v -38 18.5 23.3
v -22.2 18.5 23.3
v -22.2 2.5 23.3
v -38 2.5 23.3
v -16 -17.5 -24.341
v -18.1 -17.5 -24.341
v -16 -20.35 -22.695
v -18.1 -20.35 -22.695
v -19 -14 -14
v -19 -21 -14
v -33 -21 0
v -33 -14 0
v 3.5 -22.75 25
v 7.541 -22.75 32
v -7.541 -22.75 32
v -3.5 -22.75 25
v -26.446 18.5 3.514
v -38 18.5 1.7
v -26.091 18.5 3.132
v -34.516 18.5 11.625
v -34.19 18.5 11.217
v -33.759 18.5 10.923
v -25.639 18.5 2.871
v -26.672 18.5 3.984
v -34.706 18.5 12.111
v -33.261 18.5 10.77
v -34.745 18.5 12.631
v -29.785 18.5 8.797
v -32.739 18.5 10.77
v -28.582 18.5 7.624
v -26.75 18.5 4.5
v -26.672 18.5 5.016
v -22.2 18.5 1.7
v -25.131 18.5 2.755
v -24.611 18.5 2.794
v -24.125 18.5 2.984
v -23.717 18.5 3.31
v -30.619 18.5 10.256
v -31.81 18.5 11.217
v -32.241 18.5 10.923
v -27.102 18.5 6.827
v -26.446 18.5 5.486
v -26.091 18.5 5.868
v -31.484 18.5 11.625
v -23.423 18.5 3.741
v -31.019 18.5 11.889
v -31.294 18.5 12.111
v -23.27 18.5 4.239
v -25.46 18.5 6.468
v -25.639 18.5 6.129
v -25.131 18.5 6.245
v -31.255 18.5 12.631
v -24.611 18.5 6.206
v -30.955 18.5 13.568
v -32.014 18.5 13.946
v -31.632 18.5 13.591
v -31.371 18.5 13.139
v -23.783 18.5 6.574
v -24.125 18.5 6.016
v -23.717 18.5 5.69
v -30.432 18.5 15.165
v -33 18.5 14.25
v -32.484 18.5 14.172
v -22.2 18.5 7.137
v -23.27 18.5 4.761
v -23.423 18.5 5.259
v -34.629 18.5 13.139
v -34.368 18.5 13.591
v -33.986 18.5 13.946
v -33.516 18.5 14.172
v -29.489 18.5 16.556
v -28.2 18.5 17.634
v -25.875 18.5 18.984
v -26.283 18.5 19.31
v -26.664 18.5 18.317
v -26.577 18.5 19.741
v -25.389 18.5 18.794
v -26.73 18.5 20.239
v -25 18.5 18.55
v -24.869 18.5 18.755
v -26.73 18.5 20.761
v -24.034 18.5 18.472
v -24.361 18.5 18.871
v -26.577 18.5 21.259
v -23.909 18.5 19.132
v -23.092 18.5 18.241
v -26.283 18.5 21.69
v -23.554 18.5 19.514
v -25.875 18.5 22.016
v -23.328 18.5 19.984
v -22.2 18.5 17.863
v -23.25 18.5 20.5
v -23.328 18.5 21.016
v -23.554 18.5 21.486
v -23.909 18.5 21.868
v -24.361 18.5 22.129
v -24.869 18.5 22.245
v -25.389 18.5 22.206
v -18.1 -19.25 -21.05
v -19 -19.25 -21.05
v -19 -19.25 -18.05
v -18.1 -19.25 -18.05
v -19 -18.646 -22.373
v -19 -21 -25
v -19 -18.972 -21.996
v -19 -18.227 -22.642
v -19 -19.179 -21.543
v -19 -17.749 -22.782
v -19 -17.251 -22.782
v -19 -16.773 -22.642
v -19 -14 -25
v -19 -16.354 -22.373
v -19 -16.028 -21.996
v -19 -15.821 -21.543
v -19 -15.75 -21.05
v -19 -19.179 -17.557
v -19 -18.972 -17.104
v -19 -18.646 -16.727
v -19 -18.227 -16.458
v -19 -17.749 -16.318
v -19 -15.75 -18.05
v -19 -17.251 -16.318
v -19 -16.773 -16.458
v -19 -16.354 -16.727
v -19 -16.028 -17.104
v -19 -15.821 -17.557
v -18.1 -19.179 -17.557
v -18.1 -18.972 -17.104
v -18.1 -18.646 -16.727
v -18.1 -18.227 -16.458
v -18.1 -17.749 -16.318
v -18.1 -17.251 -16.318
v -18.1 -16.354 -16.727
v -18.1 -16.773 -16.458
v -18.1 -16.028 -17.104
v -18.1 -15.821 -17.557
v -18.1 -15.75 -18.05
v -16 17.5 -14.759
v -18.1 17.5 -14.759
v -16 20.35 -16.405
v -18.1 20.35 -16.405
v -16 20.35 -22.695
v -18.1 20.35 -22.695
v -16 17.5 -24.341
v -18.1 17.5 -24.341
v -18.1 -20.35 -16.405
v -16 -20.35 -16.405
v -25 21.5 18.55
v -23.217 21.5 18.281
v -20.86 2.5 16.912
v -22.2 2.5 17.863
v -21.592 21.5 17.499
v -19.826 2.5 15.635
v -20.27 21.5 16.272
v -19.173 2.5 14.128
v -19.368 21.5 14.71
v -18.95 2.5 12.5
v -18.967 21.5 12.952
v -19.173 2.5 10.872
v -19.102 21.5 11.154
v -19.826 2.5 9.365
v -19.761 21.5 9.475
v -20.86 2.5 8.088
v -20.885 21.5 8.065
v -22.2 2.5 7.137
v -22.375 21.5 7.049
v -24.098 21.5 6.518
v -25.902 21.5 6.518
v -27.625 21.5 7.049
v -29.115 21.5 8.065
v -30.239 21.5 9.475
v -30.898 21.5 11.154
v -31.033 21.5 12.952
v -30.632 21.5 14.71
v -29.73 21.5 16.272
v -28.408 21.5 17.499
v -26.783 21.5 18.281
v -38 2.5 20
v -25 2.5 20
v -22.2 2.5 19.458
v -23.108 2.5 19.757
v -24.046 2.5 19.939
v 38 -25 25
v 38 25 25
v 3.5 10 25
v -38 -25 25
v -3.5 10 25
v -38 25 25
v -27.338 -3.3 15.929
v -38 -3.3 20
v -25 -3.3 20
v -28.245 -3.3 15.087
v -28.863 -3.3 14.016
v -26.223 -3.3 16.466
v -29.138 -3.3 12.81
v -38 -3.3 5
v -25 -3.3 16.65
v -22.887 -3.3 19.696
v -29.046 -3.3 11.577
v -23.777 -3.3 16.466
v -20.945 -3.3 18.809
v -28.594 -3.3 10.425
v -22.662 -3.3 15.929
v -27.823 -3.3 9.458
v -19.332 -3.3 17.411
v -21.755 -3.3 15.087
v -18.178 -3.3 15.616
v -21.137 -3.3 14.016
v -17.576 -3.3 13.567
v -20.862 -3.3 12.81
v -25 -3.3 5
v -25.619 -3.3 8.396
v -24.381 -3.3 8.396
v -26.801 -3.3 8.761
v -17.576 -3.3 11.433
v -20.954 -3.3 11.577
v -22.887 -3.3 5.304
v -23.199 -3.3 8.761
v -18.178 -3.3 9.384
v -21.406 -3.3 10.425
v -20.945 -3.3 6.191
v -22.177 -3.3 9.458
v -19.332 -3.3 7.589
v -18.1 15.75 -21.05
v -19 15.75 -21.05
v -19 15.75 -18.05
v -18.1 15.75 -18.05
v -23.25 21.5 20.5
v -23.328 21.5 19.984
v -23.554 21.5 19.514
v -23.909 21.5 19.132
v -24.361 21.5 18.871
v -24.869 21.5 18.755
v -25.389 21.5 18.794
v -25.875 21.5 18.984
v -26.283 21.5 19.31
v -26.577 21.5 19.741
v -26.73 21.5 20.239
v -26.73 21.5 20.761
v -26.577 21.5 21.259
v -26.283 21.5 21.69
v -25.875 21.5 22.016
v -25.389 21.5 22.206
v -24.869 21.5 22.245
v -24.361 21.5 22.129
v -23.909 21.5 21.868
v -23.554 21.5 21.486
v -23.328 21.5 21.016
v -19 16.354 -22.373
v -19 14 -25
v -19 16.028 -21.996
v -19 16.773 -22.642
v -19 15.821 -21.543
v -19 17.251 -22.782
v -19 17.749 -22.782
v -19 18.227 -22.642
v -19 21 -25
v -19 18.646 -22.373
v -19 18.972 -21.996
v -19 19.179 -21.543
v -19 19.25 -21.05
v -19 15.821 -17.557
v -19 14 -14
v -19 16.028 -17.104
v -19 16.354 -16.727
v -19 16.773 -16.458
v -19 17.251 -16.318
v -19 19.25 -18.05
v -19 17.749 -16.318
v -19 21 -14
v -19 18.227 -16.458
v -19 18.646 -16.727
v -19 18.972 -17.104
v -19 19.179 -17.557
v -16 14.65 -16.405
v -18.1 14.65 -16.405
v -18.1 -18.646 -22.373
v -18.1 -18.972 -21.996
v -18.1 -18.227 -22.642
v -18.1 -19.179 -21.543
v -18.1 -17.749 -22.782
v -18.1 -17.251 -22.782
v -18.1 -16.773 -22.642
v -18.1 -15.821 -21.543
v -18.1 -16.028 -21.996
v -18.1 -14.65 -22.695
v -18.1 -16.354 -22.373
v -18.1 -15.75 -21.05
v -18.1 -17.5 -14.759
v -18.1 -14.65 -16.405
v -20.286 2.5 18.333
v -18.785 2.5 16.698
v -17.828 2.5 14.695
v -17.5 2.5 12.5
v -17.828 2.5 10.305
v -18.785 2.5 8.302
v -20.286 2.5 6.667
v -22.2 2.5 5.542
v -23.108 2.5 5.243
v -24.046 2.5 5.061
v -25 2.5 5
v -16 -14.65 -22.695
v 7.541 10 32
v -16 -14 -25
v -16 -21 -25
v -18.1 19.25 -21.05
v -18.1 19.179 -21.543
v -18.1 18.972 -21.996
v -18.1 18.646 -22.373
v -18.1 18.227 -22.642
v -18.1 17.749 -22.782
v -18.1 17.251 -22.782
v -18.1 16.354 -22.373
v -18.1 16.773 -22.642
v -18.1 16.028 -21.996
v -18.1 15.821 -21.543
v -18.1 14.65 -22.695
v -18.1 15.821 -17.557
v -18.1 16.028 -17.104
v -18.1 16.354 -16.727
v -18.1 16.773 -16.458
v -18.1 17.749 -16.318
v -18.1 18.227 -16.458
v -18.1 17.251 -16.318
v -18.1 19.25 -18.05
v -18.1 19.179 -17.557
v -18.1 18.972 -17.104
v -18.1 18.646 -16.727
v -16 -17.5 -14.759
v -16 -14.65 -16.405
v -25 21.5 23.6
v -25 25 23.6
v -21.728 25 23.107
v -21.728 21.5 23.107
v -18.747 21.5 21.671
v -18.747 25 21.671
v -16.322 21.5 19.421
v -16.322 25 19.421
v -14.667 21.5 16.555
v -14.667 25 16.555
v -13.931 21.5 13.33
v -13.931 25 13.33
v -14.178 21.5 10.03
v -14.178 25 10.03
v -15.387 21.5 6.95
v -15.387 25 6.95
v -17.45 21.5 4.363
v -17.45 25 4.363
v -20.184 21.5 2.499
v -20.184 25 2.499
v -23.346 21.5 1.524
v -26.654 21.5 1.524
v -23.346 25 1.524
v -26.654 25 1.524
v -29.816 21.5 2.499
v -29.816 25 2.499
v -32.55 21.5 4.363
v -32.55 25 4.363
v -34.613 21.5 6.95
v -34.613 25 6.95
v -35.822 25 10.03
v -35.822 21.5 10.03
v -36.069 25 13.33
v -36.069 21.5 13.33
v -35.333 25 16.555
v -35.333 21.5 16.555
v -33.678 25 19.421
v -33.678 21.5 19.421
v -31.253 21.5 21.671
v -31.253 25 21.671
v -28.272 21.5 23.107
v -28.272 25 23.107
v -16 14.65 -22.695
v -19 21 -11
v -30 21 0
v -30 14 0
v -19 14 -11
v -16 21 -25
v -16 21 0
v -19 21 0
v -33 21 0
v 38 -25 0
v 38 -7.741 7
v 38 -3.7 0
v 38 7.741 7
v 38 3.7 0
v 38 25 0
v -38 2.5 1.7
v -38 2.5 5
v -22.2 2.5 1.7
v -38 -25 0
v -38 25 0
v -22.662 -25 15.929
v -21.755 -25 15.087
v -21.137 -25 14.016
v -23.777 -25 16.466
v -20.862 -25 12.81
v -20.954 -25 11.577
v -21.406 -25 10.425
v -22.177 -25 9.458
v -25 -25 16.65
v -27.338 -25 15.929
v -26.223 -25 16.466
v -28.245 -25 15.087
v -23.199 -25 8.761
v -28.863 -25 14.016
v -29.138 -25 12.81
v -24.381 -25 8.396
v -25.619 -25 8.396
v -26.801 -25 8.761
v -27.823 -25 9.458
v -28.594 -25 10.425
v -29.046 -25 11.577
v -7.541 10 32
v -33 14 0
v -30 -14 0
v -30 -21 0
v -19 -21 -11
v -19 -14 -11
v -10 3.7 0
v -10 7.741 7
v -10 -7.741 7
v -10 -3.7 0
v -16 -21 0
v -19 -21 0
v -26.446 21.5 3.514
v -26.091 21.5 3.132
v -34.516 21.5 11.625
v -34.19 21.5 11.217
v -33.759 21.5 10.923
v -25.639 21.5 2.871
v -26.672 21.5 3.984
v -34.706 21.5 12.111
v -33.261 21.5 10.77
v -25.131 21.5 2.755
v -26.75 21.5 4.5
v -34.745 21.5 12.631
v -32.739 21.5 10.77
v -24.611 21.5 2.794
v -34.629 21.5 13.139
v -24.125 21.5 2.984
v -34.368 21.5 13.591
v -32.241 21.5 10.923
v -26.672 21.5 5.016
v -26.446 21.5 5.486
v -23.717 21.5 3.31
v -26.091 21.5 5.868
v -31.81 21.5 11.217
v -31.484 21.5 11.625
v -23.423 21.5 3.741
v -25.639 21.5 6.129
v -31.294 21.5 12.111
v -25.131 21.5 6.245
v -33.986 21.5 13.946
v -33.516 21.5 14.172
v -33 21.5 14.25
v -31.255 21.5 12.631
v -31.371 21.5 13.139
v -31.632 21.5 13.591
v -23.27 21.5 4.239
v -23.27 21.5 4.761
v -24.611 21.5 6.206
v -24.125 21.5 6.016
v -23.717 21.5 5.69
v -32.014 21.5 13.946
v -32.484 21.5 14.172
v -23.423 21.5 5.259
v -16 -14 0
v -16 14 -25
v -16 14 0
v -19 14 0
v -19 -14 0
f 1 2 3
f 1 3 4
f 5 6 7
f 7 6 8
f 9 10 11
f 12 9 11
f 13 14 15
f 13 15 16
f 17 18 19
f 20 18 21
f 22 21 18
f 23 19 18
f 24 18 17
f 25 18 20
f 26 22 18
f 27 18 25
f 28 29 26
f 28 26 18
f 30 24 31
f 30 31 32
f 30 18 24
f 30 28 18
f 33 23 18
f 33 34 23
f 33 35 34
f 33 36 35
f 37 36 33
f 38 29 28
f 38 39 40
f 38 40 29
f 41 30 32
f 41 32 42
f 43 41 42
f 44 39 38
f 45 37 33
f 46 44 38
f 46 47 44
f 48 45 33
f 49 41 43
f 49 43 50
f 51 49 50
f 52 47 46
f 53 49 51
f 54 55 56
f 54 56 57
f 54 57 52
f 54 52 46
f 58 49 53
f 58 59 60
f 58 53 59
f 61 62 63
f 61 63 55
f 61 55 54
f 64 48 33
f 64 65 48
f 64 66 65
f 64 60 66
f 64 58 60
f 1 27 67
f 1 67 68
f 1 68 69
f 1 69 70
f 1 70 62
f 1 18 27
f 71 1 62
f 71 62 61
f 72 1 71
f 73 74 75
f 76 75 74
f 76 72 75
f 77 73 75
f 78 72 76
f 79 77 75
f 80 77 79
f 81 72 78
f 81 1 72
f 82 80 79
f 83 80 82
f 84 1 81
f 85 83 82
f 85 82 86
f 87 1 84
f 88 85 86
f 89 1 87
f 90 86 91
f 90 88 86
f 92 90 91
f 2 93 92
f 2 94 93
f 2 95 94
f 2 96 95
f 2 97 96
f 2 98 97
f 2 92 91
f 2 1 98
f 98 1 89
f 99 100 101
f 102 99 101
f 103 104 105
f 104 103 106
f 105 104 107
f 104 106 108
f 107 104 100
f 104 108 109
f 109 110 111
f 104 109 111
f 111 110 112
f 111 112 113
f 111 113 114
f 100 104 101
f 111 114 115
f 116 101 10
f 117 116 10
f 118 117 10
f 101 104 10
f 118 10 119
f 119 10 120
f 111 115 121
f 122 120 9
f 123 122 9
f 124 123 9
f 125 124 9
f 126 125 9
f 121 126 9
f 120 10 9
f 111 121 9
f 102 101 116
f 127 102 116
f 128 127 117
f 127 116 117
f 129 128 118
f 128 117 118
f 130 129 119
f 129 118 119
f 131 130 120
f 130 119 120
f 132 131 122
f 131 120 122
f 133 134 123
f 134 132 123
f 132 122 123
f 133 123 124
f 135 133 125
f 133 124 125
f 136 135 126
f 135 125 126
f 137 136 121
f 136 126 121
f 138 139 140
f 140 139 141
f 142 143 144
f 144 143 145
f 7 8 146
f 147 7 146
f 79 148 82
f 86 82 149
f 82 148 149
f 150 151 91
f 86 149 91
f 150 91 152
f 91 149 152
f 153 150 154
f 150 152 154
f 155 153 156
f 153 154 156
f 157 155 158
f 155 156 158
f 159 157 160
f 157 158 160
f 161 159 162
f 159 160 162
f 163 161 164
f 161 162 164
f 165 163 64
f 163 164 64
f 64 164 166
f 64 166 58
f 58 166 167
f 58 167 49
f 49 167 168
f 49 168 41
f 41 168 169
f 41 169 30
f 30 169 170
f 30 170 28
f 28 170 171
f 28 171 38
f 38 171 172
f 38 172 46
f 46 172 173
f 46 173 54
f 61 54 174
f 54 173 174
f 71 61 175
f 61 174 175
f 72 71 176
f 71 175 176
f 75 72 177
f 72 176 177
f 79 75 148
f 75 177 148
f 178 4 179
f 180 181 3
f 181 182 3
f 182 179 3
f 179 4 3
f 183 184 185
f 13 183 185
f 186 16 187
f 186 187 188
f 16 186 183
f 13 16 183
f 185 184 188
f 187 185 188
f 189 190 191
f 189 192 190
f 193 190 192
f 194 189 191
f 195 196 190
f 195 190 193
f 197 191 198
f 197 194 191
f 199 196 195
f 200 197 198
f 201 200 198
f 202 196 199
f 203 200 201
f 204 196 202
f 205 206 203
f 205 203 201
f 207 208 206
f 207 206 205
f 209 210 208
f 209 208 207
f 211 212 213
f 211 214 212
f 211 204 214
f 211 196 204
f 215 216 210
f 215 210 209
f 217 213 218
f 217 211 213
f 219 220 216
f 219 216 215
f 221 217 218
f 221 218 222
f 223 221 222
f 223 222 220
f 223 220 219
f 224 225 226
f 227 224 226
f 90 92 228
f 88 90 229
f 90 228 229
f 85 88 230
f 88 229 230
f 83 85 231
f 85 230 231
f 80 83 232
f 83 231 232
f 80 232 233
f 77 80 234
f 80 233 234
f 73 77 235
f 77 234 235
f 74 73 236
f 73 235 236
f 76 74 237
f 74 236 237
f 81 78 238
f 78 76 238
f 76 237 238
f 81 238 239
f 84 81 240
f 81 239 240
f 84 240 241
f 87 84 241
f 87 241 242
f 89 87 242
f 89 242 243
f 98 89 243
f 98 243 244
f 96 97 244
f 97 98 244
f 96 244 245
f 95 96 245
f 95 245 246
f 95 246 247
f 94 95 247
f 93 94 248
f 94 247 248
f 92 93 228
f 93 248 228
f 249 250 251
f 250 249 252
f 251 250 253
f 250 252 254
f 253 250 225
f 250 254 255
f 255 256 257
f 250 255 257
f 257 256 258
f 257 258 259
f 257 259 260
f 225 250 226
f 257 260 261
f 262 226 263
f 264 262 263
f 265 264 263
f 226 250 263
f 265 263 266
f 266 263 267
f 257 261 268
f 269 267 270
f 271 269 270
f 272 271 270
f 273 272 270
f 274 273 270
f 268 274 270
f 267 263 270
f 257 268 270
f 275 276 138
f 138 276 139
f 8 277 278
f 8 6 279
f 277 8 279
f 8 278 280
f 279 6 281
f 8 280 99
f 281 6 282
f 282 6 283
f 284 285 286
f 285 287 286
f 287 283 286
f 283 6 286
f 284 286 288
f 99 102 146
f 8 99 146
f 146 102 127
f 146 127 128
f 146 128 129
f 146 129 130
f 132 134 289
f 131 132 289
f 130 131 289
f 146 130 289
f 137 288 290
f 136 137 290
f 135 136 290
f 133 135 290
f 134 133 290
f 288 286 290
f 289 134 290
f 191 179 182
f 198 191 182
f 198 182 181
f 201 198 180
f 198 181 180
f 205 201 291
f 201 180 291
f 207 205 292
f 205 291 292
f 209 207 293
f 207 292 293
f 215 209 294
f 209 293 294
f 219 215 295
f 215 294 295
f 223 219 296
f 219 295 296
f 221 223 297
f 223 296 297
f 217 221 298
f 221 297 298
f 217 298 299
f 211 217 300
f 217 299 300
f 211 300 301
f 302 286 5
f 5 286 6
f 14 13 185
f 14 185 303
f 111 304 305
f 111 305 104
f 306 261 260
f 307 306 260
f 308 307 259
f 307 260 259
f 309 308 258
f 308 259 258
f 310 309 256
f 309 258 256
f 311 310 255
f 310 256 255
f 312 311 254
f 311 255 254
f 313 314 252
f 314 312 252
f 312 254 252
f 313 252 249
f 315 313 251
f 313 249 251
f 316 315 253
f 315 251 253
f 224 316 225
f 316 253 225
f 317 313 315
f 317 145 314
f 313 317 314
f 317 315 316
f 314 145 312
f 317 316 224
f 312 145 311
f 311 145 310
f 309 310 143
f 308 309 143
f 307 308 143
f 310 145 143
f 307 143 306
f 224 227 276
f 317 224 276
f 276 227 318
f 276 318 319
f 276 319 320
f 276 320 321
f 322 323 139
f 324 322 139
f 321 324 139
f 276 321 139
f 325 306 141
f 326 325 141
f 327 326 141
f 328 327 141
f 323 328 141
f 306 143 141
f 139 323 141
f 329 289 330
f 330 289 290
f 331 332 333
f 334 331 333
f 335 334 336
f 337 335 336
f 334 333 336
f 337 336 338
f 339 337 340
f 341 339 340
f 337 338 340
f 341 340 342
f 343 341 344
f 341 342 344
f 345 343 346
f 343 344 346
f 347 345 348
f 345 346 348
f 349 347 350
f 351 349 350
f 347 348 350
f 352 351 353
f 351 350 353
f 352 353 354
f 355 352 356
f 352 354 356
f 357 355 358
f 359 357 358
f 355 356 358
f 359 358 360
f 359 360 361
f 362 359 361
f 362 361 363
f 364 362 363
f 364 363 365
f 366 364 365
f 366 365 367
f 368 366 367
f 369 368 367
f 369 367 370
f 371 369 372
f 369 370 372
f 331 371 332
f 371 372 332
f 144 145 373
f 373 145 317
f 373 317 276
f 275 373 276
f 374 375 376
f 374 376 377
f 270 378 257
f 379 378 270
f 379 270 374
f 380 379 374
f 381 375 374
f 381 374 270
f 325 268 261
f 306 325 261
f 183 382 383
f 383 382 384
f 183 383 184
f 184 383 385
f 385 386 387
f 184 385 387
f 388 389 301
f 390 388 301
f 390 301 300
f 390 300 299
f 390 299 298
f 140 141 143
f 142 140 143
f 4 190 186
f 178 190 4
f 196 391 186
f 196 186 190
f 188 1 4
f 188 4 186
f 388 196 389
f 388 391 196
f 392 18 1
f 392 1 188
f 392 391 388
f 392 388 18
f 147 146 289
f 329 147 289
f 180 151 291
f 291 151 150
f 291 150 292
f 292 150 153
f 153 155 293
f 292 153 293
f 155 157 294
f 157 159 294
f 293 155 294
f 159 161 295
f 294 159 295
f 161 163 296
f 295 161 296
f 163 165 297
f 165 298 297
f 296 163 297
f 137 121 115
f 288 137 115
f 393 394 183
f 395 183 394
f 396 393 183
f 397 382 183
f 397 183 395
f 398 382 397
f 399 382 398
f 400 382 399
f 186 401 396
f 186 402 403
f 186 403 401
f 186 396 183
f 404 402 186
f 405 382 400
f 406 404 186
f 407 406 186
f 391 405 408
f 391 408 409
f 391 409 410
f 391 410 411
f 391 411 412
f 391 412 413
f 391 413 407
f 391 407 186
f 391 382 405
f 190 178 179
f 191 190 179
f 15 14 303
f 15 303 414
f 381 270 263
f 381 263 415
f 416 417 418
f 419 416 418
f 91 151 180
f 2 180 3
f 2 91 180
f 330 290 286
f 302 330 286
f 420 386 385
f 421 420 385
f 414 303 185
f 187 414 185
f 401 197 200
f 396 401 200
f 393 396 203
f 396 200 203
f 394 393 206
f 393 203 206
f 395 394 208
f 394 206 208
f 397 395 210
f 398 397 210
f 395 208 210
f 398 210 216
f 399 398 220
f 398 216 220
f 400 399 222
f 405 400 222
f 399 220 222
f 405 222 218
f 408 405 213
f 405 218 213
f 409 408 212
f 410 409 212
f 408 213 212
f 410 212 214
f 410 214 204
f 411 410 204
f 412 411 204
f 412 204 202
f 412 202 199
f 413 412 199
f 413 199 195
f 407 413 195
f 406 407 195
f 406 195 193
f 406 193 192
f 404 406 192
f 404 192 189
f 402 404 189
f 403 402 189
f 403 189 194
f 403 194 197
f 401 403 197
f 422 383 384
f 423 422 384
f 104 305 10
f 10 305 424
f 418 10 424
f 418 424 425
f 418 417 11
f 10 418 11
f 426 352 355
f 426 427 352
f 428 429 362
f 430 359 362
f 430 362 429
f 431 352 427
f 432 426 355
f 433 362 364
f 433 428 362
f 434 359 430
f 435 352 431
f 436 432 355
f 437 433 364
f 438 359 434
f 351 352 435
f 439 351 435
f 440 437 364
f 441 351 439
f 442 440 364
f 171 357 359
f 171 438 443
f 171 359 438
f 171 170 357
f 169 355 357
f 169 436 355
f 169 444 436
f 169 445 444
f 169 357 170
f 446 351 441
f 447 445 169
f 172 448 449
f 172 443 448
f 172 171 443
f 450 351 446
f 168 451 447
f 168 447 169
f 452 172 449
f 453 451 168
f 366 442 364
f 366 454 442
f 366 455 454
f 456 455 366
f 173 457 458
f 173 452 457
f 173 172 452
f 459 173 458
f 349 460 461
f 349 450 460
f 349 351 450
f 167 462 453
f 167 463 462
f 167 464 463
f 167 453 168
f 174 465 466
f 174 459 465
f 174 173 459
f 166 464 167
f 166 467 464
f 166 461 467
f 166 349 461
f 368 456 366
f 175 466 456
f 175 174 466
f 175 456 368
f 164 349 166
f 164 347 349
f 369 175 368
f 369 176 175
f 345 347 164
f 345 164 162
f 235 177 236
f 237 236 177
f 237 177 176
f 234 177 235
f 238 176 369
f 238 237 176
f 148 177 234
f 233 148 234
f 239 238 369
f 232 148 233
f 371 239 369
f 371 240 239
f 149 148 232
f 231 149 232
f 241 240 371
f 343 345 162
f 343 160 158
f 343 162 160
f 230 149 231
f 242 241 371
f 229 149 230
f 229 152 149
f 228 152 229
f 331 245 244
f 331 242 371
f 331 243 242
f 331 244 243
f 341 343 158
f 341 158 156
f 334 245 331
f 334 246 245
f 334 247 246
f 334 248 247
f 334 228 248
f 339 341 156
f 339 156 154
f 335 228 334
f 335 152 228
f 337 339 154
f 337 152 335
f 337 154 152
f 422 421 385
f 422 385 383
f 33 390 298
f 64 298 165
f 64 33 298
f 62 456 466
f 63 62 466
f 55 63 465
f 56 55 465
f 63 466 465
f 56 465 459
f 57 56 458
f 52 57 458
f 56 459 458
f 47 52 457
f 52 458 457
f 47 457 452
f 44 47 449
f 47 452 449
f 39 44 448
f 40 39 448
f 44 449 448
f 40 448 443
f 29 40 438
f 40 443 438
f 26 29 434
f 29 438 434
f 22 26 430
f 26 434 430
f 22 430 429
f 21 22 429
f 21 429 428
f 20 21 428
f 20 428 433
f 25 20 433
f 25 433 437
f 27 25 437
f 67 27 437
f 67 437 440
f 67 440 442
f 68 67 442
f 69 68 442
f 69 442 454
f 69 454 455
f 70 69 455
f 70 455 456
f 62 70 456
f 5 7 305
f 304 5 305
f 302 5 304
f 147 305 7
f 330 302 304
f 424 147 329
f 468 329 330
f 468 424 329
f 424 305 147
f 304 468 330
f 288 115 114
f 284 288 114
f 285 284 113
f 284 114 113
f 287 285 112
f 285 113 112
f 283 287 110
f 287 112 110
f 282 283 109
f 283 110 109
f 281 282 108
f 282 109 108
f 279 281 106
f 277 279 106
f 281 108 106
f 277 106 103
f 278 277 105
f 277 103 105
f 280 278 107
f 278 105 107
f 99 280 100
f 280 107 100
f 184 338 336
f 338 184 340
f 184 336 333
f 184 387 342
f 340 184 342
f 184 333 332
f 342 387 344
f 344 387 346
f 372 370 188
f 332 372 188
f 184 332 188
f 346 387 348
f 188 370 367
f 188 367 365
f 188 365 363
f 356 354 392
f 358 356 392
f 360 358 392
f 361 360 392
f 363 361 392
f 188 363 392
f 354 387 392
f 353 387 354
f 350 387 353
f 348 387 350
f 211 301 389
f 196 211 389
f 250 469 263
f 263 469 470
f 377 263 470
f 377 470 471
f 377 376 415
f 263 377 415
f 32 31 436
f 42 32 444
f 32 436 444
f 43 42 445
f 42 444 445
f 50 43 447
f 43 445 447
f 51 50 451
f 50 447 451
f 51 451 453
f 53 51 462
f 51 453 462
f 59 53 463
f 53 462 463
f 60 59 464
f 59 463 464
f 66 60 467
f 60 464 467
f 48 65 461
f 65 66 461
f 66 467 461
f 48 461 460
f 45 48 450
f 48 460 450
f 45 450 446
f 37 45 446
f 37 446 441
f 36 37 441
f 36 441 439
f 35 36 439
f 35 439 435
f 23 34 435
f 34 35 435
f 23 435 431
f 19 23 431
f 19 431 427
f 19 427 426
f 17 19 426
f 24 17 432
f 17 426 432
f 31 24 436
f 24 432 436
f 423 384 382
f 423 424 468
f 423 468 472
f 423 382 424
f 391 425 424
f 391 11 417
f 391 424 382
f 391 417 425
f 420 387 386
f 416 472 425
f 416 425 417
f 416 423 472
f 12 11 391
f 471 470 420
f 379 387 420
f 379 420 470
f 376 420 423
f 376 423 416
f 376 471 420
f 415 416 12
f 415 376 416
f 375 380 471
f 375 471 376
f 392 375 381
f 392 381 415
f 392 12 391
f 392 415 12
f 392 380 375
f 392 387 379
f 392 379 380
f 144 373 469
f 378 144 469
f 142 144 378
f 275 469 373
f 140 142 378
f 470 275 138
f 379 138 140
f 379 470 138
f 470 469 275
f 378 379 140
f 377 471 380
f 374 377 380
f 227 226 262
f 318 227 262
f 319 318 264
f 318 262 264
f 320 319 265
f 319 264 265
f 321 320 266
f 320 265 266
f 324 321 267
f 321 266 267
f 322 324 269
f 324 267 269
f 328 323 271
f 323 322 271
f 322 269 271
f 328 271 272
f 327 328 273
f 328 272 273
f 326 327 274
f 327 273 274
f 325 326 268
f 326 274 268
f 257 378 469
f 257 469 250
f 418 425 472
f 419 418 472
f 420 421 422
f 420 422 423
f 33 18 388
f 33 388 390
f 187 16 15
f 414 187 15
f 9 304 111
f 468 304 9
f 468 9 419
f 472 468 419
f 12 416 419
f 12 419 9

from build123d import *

# Parameters (mm, degrees)
SKETCH1_W                       = 38
SKETCH1_H                       = 50
BOSS_EXTRUDE1_DEPTH             = 25
BOSS_EXTRUDE2_START             = -22.75
BOSS_EXTRUDE2_DEPTH             = 32.75
CUT_EXTRUDE1_DEPTH              = 10
CUT_EXTRUDE2_REACH              = 88.168
CUT_EXTRUDE2_DIRECTION_2_DEPTH  = 87.168439698
SKETCH15_R                      = 11.1
CUT_EXTRUDE8_DEPTH              = 3.5
SKETCH16_R                      = 6.05
CUT_EXTRUDE9_DEPTH              = 19
SKETCH17_R                      = 6.05
CUT_EXTRUDE10_DEPTH             = 5.8
CUT_EXTRUDE11_START             = -16
CUT_EXTRUDE11_DEPTH             = 16
SKETCH19_R                      = 1.75
CUT_EXTRUDE12_DEPTH             = 19
CIRPATTERN1_COUNT               = 2
CIRPATTERN1_ANGLE               = 90
CIRPATTERN1_THE_OTHER_WAY_COUNT = 2
CIRPATTERN1_THE_OTHER_WAY_ANGLE = 90
SKETCH20_R                      = 4.15
CUT_EXTRUDE13_DEPTH             = 58.174207472
SKETCH21_R                      = 1.75
CUT_EXTRUDE14_DEPTH             = 16
SKETCH22_W                      = 3
SKETCH22_H                      = 7
BOSS_EXTRUDE5_DEPTH             = 25
CUT_EXTRUDE15_DEPTH             = 10
CUT_EXTRUDE16_START             = 2.1
CUT_EXTRUDE16_DEPTH             = 2.1
BOSS_EXTRUDE7_DEPTH             = 7
BOSS_EXTRUDE8_DEPTH             = 7


with BuildPart() as part:
    # Sketch1 → Boss-Extrude1 (new body)
    with BuildSketch(Plane.XY):
        with Locations((-19, 0)):
            Rectangle(SKETCH1_W, SKETCH1_H)
    boss_extrude1 = extrude(amount=BOSS_EXTRUDE1_DEPTH)

    # Sketch2 → Boss-Extrude2 (add)
    with BuildSketch(Plane(origin=(0, 0, 0), x_dir=(0, 0, -1), z_dir=(0, 1, 0)).offset(BOSS_EXTRUDE2_START)):
        Polygon((-25, 0), (-25, 3.5), (-32, 7.541451884), (-32, 0), align=None)
    boss_extrude2 = extrude(amount=BOSS_EXTRUDE2_DEPTH)

    # Sketch3 → Cut-Extrude1 (cut)
    with BuildSketch(Plane(origin=(0, 0, 0), x_dir=(0, 0, -1), z_dir=(1, 0, 0))):
        Polygon((0, -3.7), (0, 3.7), (-7, 7.741451884), (-7, -7.741451884), align=None)
    cut_extrude1 = extrude(amount=-CUT_EXTRUDE1_DEPTH, mode=Mode.SUBTRACT)

    # Mirror1: Boss-Extrude1, Boss-Extrude2, Cut-Extrude1 across plane
    add(boss_extrude1.mirror(Plane(origin=(0, 0, 0), x_dir=(0, 0, 1), z_dir=(1, 0, 0))))
    add(boss_extrude2.mirror(Plane(origin=(0, 0, 0), x_dir=(0, 0, 1), z_dir=(1, 0, 0))))
    add(cut_extrude1.mirror(Plane(origin=(0, 0, 0), x_dir=(0, 0, 1), z_dir=(1, 0, 0))), mode=Mode.SUBTRACT)

    # Sketch4 → Cut-Extrude2 (cut, up to next)
    with BuildSketch(Plane(origin=(38, 0, 0), x_dir=(0, 0, -1), z_dir=(1, 0, 0)), mode=Mode.PRIVATE) as cut_extrude2_sk1:
        Polygon((0, -3.7), (0, 3.7), (-7, 7.741451884), (-7, -7.741451884), align=None)
    cut_extrude2_tool1 = extrude(cut_extrude2_sk1.sketch, amount=-CUT_EXTRUDE2_REACH, mode=Mode.PRIVATE) & part.part
    add(cut_extrude2_tool1.solids().sort_by_distance((38, 0, 3.9121))[0], mode=Mode.SUBTRACT)

    # Sketch4 → Cut-Extrude2 direction 2 (cut)
    with BuildSketch(Plane(origin=(38, 0, 0), x_dir=(0, 0, -1), z_dir=(1, 0, 0))):
        Polygon((0, -3.7), (0, 3.7), (-7, 7.741451884), (-7, -7.741451884), align=None)
    extrude(amount=CUT_EXTRUDE2_DIRECTION_2_DEPTH, mode=Mode.SUBTRACT)

    # Sketch15 → Cut-Extrude8 (cut)
    with BuildSketch(Plane(origin=(0, 25, 0), x_dir=(1, 0, 0), z_dir=(0, 1, 0))):
        with Locations(Location((-25, -12.5, 0), (0, 0, 270))):
            Circle(SKETCH15_R)
    extrude(amount=-CUT_EXTRUDE8_DEPTH, mode=Mode.SUBTRACT)

    # Sketch16 → Cut-Extrude9 (cut)
    with BuildSketch(Plane(origin=(0, 21.5, 0), x_dir=(1, 0, 0), z_dir=(0, 1, 0))):
        with Locations(Location((-25, -12.5, 0), (0, 0, 270))):
            Circle(SKETCH16_R)
    extrude(amount=-CUT_EXTRUDE9_DEPTH, mode=Mode.SUBTRACT)

    # Sketch17 → Cut-Extrude10 (cut)
    # profile 1 of 2: a face of its own
    with BuildSketch(Plane(origin=(0, 2.5, 0), x_dir=(1, 0, 0), z_dir=(0, 1, 0))):
        with BuildLine():
            ThreePointArc((-25, -20), (-17.5, -12.5), (-25, -5))
            Line((-25, -5), (-38, -5))
            Line((-38, -5), (-38, -20))
            Line((-38, -20), (-25, -20))
        make_face()
        with Locations(Location((-25, -12.5, 0), (0, 0, 270))):
            Circle(SKETCH17_R, mode=Mode.SUBTRACT)
    # profile 2 of 2: a face of its own
    with BuildSketch(Plane(origin=(0, 2.5, 0), x_dir=(1, 0, 0), z_dir=(0, 1, 0))):
        with Locations(Location((-25, -12.5, 0), (0, 0, 270))):
            Circle(SKETCH17_R)
    extrude(amount=-CUT_EXTRUDE10_DEPTH, mode=Mode.SUBTRACT)

    # Sketch18 → Cut-Extrude11 (cut)
    with BuildSketch(Plane.XZ.offset(-2.5).offset(CUT_EXTRUDE11_START)):
        with BuildLine():
            Line((-25, 18.55), (-38, 18.55))
            Line((-38, 18.55), (-38, 6.45))
            Line((-38, 6.45), (-25, 6.45))
            ThreePointArc((-25, 6.45), (-18.95, 12.5), (-25, 18.55))
        make_face()
    extrude(amount=CUT_EXTRUDE11_DEPTH, mode=Mode.SUBTRACT)

    # Sketch19 → Cut-Extrude12 (cut)
    with BuildSketch(Plane(origin=(0, 21.5, 0), x_dir=(1, 0, 0), z_dir=(0, 1, 0))):
        with Locations(Location((-33, -12.5, 0), (0, 0, 270))):
            Circle(SKETCH19_R)
    cut_extrude12 = extrude(amount=-CUT_EXTRUDE12_DEPTH, mode=Mode.SUBTRACT)

    # CirPattern1: Cut-Extrude12 ×2 about axis
    cirpattern1_axis = Axis((-25, 24.978467243, 12.5), (0, 1, 0))
    for i in range(1, CIRPATTERN1_COUNT):
        add(cut_extrude12.rotate(cirpattern1_axis, i * CIRPATTERN1_ANGLE / (CIRPATTERN1_COUNT - 1)), mode=Mode.SUBTRACT)

    # CirPattern1 the other way: Cut-Extrude12 ×2 about axis
    cirpattern1_the_other_way_axis = Axis((-25, 24.978467243, 12.5), (0, -1, 0))
    for i in range(1, CIRPATTERN1_THE_OTHER_WAY_COUNT):
        add(cut_extrude12.rotate(cirpattern1_the_other_way_axis, i * CIRPATTERN1_THE_OTHER_WAY_ANGLE / (CIRPATTERN1_THE_OTHER_WAY_COUNT - 1)), mode=Mode.SUBTRACT)

    # Sketch20 → Cut-Extrude13 (cut, through all)
    with BuildSketch(Plane(origin=(0, -3.3, 0), x_dir=(1, 0, 0), z_dir=(0, 1, 0))):
        with Locations(Location((-25, -12.5, 0), (0, 0, 270))):
            Circle(SKETCH20_R)
    extrude(amount=-CUT_EXTRUDE13_DEPTH, mode=Mode.SUBTRACT)

    # Sketch21 → Cut-Extrude14 (cut)
    with BuildSketch(Plane.XZ.offset(-18.5)):
        with BuildLine():
            Line((-38, 6.45), (-38, 1.7))
            Line((-38, 1.7), (-22.2, 1.7))
            Line((-22.2, 1.7), (-22.2, 23.3))
            Line((-22.2, 23.3), (-38, 23.3))
            Line((-38, 23.3), (-38, 18.55))
            Line((-38, 18.55), (-25, 18.55))
            ThreePointArc((-25, 18.55), (-31.05, 12.5), (-25, 6.45))
            Line((-25, 6.45), (-38, 6.45))
        make_face()
        with Locations(Location((-25, 4.5, 0), (0, 0, 180))):
            Circle(SKETCH21_R, mode=Mode.SUBTRACT)
        with Locations((-25, 20.5)):
            Circle(SKETCH21_R, mode=Mode.SUBTRACT)
    extrude(amount=CUT_EXTRUDE14_DEPTH, mode=Mode.SUBTRACT)

    # Sketch22 → Boss-Extrude5 (add)
    with BuildSketch(Plane(origin=(0, 0, 0), x_dir=(-1, 0, 0), z_dir=(0, 0, -1))):
        with Locations((17.5, 17.5)):
            Rectangle(SKETCH22_W, SKETCH22_H)
        with Locations((17.5, -17.5)):
            Rectangle(SKETCH22_W, SKETCH22_H)
    extrude(amount=BOSS_EXTRUDE5_DEPTH)

    # Sketch23 → Cut-Extrude15 (cut)
    with BuildSketch(Plane.ZY.offset(19)):
        with BuildLine():
            Line((-18.05, 19.25), (-21.05, 19.25))
            ThreePointArc((-21.05, 19.25), (-22.8, 17.5), (-21.05, 15.75))
            Line((-21.05, 15.75), (-18.05, 15.75))
            ThreePointArc((-18.05, 15.75), (-16.3, 17.5), (-18.05, 19.25))
        make_face()
        with BuildLine():
            Line((-18.05, -15.75), (-21.05, -15.75))
            ThreePointArc((-21.05, -15.75), (-22.8, -17.5), (-21.05, -19.25))
            Line((-21.05, -19.25), (-18.05, -19.25))
            ThreePointArc((-18.05, -19.25), (-16.3, -17.5), (-18.05, -15.75))
        make_face()
    extrude(amount=-CUT_EXTRUDE15_DEPTH, mode=Mode.SUBTRACT)

    # Sketch24 → Cut-Extrude16 (cut)
    with BuildSketch(Plane.ZY.offset(16).offset(CUT_EXTRUDE16_START)):
        with BuildLine():
            Line((-21.05, 19.25), (-20.330533563, 19.25))
            Line((-20.330533563, 19.25), (-19.695448267, 20.35))
            Line((-19.695448267, 20.35), (-22.695448267, 20.35))
            Line((-22.695448267, 20.35), (-24.340896534, 17.5))
            Line((-24.340896534, 17.5), (-22.695448267, 14.65))
            Line((-22.695448267, 14.65), (-19.695448267, 14.65))
            Line((-19.695448267, 14.65), (-20.330533563, 15.75))
            Line((-20.330533563, 15.75), (-21.05, 15.75))
            ThreePointArc((-21.05, 15.75), (-22.8, 17.5), (-21.05, 19.25))
        make_face()
        with BuildLine():
            Line((-19.404551733, 20.35), (-18.769466437, 19.25))
            Line((-18.769466437, 19.25), (-18.05, 19.25))
            ThreePointArc((-18.05, 19.25), (-16.3, 17.5), (-18.05, 15.75))
            Line((-18.05, 15.75), (-18.769466437, 15.75))
            Line((-18.769466437, 15.75), (-19.404551733, 14.65))
            Line((-19.404551733, 14.65), (-16.404551733, 14.65))
            Line((-16.404551733, 14.65), (-14.759103466, 17.5))
            Line((-14.759103466, 17.5), (-16.404551733, 20.35))
            Line((-16.404551733, 20.35), (-19.404551733, 20.35))
        make_face()
        Polygon((-20.330533563, 19.25), (-18.769466437, 19.25), (-19.404551733, 20.35), (-19.695448267, 20.35), align=None)
        Polygon((-19.404551733, 14.65), (-18.769466437, 15.75), (-20.330533563, 15.75), (-19.695448267, 14.65), align=None)
        Polygon((-19.404551733, -20.35), (-17.759103466, -17.5), (-19.404551733, -14.65), (-19.695448267, -14.65), (-21.340896534, -17.5), (-19.695448267, -20.35), align=None)
        Polygon((-21.340896534, -17.5), (-19.695448267, -14.65), (-22.695448267, -14.65), (-24.340896534, -17.5), (-22.695448267, -20.35), (-19.695448267, -20.35), align=None)
        with BuildLine():
            Line((-19.404551733, -14.65), (-18.769466437, -15.75))
            Line((-18.769466437, -15.75), (-18.05, -15.75))
            ThreePointArc((-18.05, -15.75), (-16.3, -17.5), (-18.05, -19.25))
            Line((-18.05, -19.25), (-18.769466437, -19.25))
            Line((-18.769466437, -19.25), (-19.404551733, -20.35))
            Line((-19.404551733, -20.35), (-16.404551733, -20.35))
            Line((-16.404551733, -20.35), (-14.759103466, -17.5))
            Line((-14.759103466, -17.5), (-16.404551733, -14.65))
            Line((-16.404551733, -14.65), (-19.404551733, -14.65))
        make_face()
    extrude(amount=-CUT_EXTRUDE16_DEPTH, mode=Mode.SUBTRACT)

    # Sketch26 → Boss-Extrude7 (add)
    with BuildSketch(Plane.XZ.offset(21)):
        Polygon((-19, -14), (-33, 0), (-30, 0), (-19, -11), align=None)
    extrude(amount=-BOSS_EXTRUDE7_DEPTH)

    # Sketch28 → Boss-Extrude8 (add)
    with BuildSketch(Plane(origin=(0, 21, 0), x_dir=(1, 0, 0), z_dir=(0, 1, 0))):
        Polygon((-33, 0), (-30, 0), (-19, 11), (-19, 14), align=None)
    extrude(amount=-BOSS_EXTRUDE8_DEPTH)


solid = part.part
